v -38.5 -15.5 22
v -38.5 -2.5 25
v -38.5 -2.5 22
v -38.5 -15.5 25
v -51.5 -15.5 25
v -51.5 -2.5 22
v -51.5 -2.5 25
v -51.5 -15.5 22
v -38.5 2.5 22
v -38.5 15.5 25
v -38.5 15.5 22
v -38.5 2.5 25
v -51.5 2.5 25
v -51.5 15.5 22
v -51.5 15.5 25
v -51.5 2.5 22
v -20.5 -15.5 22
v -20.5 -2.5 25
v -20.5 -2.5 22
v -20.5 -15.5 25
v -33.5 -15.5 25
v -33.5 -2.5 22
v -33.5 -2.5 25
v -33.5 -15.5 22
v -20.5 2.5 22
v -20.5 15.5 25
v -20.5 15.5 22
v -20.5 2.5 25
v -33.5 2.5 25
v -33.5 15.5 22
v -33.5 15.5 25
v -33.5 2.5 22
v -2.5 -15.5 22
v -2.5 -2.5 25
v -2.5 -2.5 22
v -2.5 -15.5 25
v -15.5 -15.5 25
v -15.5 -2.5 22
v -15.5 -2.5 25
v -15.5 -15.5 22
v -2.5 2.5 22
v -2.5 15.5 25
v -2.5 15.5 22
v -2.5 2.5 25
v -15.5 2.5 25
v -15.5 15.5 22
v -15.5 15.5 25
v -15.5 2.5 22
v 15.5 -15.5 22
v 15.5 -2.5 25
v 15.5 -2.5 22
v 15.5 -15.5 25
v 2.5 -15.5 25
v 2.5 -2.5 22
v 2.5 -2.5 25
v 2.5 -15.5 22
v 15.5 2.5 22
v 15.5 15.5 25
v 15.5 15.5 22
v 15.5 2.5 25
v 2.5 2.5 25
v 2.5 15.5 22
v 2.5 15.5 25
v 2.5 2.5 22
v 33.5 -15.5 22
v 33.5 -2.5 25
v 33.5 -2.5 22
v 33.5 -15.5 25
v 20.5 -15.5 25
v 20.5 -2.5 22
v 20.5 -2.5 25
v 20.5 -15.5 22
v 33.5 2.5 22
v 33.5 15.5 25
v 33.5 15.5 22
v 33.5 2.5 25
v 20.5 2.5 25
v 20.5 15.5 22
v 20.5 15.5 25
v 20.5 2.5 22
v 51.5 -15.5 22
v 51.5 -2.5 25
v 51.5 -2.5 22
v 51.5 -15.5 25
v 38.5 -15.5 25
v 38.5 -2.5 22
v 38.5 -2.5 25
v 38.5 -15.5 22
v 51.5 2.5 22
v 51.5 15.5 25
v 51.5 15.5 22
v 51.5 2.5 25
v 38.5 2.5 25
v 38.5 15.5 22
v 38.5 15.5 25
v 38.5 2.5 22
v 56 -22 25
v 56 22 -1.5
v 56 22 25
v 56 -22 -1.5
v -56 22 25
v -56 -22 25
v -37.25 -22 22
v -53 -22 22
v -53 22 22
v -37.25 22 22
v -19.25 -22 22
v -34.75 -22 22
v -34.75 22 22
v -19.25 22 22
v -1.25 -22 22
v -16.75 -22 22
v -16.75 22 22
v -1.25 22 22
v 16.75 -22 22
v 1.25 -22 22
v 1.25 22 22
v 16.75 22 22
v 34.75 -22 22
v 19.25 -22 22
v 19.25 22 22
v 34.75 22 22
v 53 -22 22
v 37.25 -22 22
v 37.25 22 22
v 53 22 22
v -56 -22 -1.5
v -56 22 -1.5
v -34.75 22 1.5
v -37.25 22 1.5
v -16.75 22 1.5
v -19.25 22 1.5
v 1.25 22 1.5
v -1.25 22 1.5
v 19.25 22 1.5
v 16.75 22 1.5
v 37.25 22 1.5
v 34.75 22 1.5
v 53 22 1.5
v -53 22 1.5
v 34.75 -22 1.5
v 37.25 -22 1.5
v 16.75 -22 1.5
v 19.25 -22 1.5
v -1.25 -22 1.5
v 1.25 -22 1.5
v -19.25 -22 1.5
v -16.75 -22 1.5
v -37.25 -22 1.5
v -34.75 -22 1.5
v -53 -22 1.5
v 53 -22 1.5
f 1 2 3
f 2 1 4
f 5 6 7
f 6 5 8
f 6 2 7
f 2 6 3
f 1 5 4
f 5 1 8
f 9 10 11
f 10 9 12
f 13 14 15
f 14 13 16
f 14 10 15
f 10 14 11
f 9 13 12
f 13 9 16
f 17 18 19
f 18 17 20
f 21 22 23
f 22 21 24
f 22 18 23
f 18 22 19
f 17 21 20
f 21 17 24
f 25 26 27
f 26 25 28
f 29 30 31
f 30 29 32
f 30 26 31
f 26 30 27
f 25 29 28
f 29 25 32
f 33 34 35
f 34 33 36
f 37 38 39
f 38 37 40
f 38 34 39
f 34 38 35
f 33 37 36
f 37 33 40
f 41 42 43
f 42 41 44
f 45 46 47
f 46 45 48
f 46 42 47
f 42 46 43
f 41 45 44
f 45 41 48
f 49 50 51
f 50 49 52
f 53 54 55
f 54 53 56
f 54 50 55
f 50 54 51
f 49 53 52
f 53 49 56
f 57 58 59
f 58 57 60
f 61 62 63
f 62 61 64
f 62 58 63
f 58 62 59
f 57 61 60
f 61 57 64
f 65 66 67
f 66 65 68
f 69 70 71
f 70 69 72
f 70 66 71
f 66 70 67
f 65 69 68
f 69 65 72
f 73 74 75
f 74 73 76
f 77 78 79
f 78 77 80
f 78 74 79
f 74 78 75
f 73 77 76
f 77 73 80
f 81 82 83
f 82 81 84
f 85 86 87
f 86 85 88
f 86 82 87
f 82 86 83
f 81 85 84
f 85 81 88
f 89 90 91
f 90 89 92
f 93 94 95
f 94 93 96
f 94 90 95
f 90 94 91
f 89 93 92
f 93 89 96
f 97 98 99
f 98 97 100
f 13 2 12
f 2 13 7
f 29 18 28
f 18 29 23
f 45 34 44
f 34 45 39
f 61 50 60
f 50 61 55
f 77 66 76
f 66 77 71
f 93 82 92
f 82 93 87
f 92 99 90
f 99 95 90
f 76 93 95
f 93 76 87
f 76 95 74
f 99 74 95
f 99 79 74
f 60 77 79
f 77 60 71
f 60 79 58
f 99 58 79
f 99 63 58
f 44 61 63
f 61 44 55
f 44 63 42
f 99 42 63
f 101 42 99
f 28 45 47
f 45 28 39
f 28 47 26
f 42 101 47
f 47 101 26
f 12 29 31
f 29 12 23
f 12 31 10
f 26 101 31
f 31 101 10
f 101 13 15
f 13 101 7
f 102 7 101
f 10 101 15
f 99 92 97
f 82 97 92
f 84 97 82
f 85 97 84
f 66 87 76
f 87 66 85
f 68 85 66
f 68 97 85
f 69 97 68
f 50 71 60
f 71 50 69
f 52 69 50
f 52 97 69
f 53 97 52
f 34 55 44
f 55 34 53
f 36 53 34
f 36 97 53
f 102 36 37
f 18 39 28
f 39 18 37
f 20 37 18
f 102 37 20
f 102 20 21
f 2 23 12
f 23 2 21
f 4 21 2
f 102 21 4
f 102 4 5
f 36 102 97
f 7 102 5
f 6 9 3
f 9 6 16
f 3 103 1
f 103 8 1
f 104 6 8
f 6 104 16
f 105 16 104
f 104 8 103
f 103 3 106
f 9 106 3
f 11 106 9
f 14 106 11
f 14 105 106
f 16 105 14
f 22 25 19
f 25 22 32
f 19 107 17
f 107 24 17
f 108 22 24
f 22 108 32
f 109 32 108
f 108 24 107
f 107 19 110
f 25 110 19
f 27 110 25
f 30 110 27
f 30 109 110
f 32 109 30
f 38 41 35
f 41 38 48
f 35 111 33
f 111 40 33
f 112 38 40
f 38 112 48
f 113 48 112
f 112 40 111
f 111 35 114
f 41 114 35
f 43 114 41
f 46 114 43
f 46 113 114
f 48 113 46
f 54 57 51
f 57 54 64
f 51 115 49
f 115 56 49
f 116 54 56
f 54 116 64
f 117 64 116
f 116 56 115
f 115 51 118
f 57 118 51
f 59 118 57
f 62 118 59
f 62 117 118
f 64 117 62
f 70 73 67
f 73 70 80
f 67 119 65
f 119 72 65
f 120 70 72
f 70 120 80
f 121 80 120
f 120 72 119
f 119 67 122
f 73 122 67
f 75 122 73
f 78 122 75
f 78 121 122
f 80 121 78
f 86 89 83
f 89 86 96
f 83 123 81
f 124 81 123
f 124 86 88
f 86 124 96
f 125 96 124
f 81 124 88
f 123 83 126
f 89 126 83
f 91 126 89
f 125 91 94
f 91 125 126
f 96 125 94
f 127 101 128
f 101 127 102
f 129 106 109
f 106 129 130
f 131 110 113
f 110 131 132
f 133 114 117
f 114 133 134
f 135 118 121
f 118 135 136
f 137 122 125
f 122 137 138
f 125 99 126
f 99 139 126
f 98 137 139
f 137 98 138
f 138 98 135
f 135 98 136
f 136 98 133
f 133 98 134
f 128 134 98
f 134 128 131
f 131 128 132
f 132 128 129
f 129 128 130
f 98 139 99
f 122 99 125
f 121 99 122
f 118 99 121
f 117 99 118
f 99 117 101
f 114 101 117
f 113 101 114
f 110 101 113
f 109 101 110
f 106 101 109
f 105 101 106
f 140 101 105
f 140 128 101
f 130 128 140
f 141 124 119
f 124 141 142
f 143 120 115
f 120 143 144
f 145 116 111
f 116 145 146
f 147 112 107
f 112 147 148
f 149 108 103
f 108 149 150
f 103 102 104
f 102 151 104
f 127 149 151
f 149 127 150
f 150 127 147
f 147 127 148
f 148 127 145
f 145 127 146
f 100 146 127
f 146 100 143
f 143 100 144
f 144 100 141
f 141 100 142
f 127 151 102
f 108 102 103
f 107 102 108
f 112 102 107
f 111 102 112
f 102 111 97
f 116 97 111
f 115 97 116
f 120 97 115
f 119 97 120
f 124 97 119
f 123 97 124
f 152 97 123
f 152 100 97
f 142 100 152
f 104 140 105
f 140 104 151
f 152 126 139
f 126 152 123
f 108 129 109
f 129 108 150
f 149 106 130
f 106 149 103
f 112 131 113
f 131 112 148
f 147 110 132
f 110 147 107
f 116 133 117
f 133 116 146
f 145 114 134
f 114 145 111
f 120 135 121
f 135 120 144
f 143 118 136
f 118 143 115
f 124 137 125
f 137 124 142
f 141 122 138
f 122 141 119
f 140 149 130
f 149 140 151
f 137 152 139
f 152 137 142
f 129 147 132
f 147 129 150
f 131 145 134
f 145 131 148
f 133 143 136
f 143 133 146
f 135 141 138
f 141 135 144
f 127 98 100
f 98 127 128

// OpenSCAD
// 12-cuvette rack, printed standing on its base (z = 0 to 25)
$fn = 64;

// ---- overall envelope ----
base_w   = 112;   // X size of base & deck plates
base_d   = 44;    // Y size of base & deck plates
base_t   = 3;     // base plate thickness (z 0..3)
deck_t   = 3;     // deck plate thickness (z 22..25)
wall_h   = 25;    // total height of end walls & ribs (z 0..25)

// ---- end walls (flush with short ends, 3 mm thick) ----
ew_t     = 3;     // end wall thickness
ew_x     = base_w/2 - ew_t/2;   // centre x of each end wall (±54.5)

// ---- internal ribs (2.5 mm thick, centred at given x) ----
rib_t    = 2.5;
rib_x    = [-36, -18, 0, 18, 36];

// ---- deck through-holes (13 x 13 mm, sides parallel to edges) ----
hole_s   = 13;    // square hole side
pitch    = 18;    // centre-to-centre spacing in X and Y
n_x      = 6;     // holes per row (along X)
n_y      = 2;     // number of rows (along Y)

// ---- base plate (z 0..3) ----
translate([0, 0, 0])
    cube([base_w, base_d, base_t], center = true);

// ---- deck plate (z 22..25) with 12 square through-holes ----
translate([0, 0, 22 + deck_t/2])
    difference() {
        cube([base_w, base_d, deck_t], center = true);
        for (i = [0 : n_x - 1])
        for (j = [0 : n_y - 1]) {
            hx = (i - (n_x - 1)/2) * pitch;   // centred on deck in X
            hy = (j - (n_y - 1)/2) * pitch;   // centred on deck in Y
            translate([hx, hy, 0])
                cube([hole_s, hole_s, deck_t + 2], center = true); // 1 mm past each face
        }
    }

// ---- two 3 mm end walls (z 0..25) ----
for (sx = [-1, 1]) {
    translate([sx * ew_x, 0, wall_h/2])
        cube([ew_t, base_d, wall_h], center = true);
}

// ---- five 2.5 mm internal ribs (z 0..25) ----
for (rx = rib_x) {
    translate([rx, 0, wall_h/2])
        cube([rib_t, base_d, wall_h], center = true);
}
